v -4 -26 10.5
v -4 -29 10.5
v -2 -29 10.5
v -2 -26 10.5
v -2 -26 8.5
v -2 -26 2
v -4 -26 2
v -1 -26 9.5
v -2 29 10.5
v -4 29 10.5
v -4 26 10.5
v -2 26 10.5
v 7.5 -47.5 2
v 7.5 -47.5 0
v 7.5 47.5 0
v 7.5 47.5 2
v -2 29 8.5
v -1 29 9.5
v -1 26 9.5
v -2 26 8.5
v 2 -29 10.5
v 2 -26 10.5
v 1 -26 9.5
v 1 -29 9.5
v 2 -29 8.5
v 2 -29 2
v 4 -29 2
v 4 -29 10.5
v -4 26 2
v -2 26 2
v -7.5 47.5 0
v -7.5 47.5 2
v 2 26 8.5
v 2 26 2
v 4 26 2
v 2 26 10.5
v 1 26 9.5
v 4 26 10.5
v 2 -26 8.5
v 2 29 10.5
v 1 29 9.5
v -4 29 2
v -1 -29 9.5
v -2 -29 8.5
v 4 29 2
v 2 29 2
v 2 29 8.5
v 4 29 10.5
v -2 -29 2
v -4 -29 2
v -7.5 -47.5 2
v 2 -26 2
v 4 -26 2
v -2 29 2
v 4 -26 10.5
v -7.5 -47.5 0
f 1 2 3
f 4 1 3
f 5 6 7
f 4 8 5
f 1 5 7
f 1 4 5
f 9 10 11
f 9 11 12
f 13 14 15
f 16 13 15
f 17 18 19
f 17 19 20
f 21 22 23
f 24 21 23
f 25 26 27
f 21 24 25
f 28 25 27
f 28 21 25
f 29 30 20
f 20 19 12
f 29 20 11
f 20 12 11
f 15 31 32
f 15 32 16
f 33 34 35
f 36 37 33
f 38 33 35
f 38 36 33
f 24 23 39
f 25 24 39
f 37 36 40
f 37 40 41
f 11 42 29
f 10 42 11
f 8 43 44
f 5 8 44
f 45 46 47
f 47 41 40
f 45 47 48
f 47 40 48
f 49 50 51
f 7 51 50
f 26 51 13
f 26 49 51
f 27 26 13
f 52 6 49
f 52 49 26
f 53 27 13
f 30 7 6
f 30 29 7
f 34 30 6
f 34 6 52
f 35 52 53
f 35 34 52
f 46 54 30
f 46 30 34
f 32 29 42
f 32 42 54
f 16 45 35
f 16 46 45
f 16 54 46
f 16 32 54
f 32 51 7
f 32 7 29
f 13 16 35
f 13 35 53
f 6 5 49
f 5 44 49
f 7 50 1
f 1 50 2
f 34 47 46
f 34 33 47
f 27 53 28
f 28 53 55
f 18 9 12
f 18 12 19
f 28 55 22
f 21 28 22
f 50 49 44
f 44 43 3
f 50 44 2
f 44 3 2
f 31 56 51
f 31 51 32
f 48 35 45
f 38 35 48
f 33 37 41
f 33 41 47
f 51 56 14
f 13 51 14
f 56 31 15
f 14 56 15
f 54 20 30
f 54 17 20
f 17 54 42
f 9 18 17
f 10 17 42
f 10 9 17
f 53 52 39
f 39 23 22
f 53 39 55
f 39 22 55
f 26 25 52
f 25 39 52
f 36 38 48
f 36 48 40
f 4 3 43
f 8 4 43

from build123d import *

# Parameters (mm, degrees)
SKETCH_W     = 15
SKETCH_H     = 95
PAD_DEPTH    = 2
PAD001_DEPTH = 1.5


with BuildPart() as part:
    # Sketch → Pad (new body)
    with BuildSketch(Plane.XY):
        Rectangle(SKETCH_W, SKETCH_H)
    extrude(amount=PAD_DEPTH)

    # Sketch001 (on DatumPlane) → Pad001 (join, symmetric)
    with BuildSketch(Plane(origin=(0, 27.5, 0), x_dir=(-1, 0, 0), z_dir=(0, 1, 0))):
        Polygon((-4, 2), (-4, 10.5), (-2, 10.5), (-1, 9.5), (-2, 8.5), (-2, 2), align=None)
        Polygon((4, 2), (4, 10.5), (2, 10.5), (1, 9.5), (2, 8.5), (2, 2), align=None)
    pad001 = extrude(amount=PAD001_DEPTH, both=True)

    # Mirrored: Pad001 across XZ
    add(pad001.mirror(Plane.XZ))


solid = part.part
